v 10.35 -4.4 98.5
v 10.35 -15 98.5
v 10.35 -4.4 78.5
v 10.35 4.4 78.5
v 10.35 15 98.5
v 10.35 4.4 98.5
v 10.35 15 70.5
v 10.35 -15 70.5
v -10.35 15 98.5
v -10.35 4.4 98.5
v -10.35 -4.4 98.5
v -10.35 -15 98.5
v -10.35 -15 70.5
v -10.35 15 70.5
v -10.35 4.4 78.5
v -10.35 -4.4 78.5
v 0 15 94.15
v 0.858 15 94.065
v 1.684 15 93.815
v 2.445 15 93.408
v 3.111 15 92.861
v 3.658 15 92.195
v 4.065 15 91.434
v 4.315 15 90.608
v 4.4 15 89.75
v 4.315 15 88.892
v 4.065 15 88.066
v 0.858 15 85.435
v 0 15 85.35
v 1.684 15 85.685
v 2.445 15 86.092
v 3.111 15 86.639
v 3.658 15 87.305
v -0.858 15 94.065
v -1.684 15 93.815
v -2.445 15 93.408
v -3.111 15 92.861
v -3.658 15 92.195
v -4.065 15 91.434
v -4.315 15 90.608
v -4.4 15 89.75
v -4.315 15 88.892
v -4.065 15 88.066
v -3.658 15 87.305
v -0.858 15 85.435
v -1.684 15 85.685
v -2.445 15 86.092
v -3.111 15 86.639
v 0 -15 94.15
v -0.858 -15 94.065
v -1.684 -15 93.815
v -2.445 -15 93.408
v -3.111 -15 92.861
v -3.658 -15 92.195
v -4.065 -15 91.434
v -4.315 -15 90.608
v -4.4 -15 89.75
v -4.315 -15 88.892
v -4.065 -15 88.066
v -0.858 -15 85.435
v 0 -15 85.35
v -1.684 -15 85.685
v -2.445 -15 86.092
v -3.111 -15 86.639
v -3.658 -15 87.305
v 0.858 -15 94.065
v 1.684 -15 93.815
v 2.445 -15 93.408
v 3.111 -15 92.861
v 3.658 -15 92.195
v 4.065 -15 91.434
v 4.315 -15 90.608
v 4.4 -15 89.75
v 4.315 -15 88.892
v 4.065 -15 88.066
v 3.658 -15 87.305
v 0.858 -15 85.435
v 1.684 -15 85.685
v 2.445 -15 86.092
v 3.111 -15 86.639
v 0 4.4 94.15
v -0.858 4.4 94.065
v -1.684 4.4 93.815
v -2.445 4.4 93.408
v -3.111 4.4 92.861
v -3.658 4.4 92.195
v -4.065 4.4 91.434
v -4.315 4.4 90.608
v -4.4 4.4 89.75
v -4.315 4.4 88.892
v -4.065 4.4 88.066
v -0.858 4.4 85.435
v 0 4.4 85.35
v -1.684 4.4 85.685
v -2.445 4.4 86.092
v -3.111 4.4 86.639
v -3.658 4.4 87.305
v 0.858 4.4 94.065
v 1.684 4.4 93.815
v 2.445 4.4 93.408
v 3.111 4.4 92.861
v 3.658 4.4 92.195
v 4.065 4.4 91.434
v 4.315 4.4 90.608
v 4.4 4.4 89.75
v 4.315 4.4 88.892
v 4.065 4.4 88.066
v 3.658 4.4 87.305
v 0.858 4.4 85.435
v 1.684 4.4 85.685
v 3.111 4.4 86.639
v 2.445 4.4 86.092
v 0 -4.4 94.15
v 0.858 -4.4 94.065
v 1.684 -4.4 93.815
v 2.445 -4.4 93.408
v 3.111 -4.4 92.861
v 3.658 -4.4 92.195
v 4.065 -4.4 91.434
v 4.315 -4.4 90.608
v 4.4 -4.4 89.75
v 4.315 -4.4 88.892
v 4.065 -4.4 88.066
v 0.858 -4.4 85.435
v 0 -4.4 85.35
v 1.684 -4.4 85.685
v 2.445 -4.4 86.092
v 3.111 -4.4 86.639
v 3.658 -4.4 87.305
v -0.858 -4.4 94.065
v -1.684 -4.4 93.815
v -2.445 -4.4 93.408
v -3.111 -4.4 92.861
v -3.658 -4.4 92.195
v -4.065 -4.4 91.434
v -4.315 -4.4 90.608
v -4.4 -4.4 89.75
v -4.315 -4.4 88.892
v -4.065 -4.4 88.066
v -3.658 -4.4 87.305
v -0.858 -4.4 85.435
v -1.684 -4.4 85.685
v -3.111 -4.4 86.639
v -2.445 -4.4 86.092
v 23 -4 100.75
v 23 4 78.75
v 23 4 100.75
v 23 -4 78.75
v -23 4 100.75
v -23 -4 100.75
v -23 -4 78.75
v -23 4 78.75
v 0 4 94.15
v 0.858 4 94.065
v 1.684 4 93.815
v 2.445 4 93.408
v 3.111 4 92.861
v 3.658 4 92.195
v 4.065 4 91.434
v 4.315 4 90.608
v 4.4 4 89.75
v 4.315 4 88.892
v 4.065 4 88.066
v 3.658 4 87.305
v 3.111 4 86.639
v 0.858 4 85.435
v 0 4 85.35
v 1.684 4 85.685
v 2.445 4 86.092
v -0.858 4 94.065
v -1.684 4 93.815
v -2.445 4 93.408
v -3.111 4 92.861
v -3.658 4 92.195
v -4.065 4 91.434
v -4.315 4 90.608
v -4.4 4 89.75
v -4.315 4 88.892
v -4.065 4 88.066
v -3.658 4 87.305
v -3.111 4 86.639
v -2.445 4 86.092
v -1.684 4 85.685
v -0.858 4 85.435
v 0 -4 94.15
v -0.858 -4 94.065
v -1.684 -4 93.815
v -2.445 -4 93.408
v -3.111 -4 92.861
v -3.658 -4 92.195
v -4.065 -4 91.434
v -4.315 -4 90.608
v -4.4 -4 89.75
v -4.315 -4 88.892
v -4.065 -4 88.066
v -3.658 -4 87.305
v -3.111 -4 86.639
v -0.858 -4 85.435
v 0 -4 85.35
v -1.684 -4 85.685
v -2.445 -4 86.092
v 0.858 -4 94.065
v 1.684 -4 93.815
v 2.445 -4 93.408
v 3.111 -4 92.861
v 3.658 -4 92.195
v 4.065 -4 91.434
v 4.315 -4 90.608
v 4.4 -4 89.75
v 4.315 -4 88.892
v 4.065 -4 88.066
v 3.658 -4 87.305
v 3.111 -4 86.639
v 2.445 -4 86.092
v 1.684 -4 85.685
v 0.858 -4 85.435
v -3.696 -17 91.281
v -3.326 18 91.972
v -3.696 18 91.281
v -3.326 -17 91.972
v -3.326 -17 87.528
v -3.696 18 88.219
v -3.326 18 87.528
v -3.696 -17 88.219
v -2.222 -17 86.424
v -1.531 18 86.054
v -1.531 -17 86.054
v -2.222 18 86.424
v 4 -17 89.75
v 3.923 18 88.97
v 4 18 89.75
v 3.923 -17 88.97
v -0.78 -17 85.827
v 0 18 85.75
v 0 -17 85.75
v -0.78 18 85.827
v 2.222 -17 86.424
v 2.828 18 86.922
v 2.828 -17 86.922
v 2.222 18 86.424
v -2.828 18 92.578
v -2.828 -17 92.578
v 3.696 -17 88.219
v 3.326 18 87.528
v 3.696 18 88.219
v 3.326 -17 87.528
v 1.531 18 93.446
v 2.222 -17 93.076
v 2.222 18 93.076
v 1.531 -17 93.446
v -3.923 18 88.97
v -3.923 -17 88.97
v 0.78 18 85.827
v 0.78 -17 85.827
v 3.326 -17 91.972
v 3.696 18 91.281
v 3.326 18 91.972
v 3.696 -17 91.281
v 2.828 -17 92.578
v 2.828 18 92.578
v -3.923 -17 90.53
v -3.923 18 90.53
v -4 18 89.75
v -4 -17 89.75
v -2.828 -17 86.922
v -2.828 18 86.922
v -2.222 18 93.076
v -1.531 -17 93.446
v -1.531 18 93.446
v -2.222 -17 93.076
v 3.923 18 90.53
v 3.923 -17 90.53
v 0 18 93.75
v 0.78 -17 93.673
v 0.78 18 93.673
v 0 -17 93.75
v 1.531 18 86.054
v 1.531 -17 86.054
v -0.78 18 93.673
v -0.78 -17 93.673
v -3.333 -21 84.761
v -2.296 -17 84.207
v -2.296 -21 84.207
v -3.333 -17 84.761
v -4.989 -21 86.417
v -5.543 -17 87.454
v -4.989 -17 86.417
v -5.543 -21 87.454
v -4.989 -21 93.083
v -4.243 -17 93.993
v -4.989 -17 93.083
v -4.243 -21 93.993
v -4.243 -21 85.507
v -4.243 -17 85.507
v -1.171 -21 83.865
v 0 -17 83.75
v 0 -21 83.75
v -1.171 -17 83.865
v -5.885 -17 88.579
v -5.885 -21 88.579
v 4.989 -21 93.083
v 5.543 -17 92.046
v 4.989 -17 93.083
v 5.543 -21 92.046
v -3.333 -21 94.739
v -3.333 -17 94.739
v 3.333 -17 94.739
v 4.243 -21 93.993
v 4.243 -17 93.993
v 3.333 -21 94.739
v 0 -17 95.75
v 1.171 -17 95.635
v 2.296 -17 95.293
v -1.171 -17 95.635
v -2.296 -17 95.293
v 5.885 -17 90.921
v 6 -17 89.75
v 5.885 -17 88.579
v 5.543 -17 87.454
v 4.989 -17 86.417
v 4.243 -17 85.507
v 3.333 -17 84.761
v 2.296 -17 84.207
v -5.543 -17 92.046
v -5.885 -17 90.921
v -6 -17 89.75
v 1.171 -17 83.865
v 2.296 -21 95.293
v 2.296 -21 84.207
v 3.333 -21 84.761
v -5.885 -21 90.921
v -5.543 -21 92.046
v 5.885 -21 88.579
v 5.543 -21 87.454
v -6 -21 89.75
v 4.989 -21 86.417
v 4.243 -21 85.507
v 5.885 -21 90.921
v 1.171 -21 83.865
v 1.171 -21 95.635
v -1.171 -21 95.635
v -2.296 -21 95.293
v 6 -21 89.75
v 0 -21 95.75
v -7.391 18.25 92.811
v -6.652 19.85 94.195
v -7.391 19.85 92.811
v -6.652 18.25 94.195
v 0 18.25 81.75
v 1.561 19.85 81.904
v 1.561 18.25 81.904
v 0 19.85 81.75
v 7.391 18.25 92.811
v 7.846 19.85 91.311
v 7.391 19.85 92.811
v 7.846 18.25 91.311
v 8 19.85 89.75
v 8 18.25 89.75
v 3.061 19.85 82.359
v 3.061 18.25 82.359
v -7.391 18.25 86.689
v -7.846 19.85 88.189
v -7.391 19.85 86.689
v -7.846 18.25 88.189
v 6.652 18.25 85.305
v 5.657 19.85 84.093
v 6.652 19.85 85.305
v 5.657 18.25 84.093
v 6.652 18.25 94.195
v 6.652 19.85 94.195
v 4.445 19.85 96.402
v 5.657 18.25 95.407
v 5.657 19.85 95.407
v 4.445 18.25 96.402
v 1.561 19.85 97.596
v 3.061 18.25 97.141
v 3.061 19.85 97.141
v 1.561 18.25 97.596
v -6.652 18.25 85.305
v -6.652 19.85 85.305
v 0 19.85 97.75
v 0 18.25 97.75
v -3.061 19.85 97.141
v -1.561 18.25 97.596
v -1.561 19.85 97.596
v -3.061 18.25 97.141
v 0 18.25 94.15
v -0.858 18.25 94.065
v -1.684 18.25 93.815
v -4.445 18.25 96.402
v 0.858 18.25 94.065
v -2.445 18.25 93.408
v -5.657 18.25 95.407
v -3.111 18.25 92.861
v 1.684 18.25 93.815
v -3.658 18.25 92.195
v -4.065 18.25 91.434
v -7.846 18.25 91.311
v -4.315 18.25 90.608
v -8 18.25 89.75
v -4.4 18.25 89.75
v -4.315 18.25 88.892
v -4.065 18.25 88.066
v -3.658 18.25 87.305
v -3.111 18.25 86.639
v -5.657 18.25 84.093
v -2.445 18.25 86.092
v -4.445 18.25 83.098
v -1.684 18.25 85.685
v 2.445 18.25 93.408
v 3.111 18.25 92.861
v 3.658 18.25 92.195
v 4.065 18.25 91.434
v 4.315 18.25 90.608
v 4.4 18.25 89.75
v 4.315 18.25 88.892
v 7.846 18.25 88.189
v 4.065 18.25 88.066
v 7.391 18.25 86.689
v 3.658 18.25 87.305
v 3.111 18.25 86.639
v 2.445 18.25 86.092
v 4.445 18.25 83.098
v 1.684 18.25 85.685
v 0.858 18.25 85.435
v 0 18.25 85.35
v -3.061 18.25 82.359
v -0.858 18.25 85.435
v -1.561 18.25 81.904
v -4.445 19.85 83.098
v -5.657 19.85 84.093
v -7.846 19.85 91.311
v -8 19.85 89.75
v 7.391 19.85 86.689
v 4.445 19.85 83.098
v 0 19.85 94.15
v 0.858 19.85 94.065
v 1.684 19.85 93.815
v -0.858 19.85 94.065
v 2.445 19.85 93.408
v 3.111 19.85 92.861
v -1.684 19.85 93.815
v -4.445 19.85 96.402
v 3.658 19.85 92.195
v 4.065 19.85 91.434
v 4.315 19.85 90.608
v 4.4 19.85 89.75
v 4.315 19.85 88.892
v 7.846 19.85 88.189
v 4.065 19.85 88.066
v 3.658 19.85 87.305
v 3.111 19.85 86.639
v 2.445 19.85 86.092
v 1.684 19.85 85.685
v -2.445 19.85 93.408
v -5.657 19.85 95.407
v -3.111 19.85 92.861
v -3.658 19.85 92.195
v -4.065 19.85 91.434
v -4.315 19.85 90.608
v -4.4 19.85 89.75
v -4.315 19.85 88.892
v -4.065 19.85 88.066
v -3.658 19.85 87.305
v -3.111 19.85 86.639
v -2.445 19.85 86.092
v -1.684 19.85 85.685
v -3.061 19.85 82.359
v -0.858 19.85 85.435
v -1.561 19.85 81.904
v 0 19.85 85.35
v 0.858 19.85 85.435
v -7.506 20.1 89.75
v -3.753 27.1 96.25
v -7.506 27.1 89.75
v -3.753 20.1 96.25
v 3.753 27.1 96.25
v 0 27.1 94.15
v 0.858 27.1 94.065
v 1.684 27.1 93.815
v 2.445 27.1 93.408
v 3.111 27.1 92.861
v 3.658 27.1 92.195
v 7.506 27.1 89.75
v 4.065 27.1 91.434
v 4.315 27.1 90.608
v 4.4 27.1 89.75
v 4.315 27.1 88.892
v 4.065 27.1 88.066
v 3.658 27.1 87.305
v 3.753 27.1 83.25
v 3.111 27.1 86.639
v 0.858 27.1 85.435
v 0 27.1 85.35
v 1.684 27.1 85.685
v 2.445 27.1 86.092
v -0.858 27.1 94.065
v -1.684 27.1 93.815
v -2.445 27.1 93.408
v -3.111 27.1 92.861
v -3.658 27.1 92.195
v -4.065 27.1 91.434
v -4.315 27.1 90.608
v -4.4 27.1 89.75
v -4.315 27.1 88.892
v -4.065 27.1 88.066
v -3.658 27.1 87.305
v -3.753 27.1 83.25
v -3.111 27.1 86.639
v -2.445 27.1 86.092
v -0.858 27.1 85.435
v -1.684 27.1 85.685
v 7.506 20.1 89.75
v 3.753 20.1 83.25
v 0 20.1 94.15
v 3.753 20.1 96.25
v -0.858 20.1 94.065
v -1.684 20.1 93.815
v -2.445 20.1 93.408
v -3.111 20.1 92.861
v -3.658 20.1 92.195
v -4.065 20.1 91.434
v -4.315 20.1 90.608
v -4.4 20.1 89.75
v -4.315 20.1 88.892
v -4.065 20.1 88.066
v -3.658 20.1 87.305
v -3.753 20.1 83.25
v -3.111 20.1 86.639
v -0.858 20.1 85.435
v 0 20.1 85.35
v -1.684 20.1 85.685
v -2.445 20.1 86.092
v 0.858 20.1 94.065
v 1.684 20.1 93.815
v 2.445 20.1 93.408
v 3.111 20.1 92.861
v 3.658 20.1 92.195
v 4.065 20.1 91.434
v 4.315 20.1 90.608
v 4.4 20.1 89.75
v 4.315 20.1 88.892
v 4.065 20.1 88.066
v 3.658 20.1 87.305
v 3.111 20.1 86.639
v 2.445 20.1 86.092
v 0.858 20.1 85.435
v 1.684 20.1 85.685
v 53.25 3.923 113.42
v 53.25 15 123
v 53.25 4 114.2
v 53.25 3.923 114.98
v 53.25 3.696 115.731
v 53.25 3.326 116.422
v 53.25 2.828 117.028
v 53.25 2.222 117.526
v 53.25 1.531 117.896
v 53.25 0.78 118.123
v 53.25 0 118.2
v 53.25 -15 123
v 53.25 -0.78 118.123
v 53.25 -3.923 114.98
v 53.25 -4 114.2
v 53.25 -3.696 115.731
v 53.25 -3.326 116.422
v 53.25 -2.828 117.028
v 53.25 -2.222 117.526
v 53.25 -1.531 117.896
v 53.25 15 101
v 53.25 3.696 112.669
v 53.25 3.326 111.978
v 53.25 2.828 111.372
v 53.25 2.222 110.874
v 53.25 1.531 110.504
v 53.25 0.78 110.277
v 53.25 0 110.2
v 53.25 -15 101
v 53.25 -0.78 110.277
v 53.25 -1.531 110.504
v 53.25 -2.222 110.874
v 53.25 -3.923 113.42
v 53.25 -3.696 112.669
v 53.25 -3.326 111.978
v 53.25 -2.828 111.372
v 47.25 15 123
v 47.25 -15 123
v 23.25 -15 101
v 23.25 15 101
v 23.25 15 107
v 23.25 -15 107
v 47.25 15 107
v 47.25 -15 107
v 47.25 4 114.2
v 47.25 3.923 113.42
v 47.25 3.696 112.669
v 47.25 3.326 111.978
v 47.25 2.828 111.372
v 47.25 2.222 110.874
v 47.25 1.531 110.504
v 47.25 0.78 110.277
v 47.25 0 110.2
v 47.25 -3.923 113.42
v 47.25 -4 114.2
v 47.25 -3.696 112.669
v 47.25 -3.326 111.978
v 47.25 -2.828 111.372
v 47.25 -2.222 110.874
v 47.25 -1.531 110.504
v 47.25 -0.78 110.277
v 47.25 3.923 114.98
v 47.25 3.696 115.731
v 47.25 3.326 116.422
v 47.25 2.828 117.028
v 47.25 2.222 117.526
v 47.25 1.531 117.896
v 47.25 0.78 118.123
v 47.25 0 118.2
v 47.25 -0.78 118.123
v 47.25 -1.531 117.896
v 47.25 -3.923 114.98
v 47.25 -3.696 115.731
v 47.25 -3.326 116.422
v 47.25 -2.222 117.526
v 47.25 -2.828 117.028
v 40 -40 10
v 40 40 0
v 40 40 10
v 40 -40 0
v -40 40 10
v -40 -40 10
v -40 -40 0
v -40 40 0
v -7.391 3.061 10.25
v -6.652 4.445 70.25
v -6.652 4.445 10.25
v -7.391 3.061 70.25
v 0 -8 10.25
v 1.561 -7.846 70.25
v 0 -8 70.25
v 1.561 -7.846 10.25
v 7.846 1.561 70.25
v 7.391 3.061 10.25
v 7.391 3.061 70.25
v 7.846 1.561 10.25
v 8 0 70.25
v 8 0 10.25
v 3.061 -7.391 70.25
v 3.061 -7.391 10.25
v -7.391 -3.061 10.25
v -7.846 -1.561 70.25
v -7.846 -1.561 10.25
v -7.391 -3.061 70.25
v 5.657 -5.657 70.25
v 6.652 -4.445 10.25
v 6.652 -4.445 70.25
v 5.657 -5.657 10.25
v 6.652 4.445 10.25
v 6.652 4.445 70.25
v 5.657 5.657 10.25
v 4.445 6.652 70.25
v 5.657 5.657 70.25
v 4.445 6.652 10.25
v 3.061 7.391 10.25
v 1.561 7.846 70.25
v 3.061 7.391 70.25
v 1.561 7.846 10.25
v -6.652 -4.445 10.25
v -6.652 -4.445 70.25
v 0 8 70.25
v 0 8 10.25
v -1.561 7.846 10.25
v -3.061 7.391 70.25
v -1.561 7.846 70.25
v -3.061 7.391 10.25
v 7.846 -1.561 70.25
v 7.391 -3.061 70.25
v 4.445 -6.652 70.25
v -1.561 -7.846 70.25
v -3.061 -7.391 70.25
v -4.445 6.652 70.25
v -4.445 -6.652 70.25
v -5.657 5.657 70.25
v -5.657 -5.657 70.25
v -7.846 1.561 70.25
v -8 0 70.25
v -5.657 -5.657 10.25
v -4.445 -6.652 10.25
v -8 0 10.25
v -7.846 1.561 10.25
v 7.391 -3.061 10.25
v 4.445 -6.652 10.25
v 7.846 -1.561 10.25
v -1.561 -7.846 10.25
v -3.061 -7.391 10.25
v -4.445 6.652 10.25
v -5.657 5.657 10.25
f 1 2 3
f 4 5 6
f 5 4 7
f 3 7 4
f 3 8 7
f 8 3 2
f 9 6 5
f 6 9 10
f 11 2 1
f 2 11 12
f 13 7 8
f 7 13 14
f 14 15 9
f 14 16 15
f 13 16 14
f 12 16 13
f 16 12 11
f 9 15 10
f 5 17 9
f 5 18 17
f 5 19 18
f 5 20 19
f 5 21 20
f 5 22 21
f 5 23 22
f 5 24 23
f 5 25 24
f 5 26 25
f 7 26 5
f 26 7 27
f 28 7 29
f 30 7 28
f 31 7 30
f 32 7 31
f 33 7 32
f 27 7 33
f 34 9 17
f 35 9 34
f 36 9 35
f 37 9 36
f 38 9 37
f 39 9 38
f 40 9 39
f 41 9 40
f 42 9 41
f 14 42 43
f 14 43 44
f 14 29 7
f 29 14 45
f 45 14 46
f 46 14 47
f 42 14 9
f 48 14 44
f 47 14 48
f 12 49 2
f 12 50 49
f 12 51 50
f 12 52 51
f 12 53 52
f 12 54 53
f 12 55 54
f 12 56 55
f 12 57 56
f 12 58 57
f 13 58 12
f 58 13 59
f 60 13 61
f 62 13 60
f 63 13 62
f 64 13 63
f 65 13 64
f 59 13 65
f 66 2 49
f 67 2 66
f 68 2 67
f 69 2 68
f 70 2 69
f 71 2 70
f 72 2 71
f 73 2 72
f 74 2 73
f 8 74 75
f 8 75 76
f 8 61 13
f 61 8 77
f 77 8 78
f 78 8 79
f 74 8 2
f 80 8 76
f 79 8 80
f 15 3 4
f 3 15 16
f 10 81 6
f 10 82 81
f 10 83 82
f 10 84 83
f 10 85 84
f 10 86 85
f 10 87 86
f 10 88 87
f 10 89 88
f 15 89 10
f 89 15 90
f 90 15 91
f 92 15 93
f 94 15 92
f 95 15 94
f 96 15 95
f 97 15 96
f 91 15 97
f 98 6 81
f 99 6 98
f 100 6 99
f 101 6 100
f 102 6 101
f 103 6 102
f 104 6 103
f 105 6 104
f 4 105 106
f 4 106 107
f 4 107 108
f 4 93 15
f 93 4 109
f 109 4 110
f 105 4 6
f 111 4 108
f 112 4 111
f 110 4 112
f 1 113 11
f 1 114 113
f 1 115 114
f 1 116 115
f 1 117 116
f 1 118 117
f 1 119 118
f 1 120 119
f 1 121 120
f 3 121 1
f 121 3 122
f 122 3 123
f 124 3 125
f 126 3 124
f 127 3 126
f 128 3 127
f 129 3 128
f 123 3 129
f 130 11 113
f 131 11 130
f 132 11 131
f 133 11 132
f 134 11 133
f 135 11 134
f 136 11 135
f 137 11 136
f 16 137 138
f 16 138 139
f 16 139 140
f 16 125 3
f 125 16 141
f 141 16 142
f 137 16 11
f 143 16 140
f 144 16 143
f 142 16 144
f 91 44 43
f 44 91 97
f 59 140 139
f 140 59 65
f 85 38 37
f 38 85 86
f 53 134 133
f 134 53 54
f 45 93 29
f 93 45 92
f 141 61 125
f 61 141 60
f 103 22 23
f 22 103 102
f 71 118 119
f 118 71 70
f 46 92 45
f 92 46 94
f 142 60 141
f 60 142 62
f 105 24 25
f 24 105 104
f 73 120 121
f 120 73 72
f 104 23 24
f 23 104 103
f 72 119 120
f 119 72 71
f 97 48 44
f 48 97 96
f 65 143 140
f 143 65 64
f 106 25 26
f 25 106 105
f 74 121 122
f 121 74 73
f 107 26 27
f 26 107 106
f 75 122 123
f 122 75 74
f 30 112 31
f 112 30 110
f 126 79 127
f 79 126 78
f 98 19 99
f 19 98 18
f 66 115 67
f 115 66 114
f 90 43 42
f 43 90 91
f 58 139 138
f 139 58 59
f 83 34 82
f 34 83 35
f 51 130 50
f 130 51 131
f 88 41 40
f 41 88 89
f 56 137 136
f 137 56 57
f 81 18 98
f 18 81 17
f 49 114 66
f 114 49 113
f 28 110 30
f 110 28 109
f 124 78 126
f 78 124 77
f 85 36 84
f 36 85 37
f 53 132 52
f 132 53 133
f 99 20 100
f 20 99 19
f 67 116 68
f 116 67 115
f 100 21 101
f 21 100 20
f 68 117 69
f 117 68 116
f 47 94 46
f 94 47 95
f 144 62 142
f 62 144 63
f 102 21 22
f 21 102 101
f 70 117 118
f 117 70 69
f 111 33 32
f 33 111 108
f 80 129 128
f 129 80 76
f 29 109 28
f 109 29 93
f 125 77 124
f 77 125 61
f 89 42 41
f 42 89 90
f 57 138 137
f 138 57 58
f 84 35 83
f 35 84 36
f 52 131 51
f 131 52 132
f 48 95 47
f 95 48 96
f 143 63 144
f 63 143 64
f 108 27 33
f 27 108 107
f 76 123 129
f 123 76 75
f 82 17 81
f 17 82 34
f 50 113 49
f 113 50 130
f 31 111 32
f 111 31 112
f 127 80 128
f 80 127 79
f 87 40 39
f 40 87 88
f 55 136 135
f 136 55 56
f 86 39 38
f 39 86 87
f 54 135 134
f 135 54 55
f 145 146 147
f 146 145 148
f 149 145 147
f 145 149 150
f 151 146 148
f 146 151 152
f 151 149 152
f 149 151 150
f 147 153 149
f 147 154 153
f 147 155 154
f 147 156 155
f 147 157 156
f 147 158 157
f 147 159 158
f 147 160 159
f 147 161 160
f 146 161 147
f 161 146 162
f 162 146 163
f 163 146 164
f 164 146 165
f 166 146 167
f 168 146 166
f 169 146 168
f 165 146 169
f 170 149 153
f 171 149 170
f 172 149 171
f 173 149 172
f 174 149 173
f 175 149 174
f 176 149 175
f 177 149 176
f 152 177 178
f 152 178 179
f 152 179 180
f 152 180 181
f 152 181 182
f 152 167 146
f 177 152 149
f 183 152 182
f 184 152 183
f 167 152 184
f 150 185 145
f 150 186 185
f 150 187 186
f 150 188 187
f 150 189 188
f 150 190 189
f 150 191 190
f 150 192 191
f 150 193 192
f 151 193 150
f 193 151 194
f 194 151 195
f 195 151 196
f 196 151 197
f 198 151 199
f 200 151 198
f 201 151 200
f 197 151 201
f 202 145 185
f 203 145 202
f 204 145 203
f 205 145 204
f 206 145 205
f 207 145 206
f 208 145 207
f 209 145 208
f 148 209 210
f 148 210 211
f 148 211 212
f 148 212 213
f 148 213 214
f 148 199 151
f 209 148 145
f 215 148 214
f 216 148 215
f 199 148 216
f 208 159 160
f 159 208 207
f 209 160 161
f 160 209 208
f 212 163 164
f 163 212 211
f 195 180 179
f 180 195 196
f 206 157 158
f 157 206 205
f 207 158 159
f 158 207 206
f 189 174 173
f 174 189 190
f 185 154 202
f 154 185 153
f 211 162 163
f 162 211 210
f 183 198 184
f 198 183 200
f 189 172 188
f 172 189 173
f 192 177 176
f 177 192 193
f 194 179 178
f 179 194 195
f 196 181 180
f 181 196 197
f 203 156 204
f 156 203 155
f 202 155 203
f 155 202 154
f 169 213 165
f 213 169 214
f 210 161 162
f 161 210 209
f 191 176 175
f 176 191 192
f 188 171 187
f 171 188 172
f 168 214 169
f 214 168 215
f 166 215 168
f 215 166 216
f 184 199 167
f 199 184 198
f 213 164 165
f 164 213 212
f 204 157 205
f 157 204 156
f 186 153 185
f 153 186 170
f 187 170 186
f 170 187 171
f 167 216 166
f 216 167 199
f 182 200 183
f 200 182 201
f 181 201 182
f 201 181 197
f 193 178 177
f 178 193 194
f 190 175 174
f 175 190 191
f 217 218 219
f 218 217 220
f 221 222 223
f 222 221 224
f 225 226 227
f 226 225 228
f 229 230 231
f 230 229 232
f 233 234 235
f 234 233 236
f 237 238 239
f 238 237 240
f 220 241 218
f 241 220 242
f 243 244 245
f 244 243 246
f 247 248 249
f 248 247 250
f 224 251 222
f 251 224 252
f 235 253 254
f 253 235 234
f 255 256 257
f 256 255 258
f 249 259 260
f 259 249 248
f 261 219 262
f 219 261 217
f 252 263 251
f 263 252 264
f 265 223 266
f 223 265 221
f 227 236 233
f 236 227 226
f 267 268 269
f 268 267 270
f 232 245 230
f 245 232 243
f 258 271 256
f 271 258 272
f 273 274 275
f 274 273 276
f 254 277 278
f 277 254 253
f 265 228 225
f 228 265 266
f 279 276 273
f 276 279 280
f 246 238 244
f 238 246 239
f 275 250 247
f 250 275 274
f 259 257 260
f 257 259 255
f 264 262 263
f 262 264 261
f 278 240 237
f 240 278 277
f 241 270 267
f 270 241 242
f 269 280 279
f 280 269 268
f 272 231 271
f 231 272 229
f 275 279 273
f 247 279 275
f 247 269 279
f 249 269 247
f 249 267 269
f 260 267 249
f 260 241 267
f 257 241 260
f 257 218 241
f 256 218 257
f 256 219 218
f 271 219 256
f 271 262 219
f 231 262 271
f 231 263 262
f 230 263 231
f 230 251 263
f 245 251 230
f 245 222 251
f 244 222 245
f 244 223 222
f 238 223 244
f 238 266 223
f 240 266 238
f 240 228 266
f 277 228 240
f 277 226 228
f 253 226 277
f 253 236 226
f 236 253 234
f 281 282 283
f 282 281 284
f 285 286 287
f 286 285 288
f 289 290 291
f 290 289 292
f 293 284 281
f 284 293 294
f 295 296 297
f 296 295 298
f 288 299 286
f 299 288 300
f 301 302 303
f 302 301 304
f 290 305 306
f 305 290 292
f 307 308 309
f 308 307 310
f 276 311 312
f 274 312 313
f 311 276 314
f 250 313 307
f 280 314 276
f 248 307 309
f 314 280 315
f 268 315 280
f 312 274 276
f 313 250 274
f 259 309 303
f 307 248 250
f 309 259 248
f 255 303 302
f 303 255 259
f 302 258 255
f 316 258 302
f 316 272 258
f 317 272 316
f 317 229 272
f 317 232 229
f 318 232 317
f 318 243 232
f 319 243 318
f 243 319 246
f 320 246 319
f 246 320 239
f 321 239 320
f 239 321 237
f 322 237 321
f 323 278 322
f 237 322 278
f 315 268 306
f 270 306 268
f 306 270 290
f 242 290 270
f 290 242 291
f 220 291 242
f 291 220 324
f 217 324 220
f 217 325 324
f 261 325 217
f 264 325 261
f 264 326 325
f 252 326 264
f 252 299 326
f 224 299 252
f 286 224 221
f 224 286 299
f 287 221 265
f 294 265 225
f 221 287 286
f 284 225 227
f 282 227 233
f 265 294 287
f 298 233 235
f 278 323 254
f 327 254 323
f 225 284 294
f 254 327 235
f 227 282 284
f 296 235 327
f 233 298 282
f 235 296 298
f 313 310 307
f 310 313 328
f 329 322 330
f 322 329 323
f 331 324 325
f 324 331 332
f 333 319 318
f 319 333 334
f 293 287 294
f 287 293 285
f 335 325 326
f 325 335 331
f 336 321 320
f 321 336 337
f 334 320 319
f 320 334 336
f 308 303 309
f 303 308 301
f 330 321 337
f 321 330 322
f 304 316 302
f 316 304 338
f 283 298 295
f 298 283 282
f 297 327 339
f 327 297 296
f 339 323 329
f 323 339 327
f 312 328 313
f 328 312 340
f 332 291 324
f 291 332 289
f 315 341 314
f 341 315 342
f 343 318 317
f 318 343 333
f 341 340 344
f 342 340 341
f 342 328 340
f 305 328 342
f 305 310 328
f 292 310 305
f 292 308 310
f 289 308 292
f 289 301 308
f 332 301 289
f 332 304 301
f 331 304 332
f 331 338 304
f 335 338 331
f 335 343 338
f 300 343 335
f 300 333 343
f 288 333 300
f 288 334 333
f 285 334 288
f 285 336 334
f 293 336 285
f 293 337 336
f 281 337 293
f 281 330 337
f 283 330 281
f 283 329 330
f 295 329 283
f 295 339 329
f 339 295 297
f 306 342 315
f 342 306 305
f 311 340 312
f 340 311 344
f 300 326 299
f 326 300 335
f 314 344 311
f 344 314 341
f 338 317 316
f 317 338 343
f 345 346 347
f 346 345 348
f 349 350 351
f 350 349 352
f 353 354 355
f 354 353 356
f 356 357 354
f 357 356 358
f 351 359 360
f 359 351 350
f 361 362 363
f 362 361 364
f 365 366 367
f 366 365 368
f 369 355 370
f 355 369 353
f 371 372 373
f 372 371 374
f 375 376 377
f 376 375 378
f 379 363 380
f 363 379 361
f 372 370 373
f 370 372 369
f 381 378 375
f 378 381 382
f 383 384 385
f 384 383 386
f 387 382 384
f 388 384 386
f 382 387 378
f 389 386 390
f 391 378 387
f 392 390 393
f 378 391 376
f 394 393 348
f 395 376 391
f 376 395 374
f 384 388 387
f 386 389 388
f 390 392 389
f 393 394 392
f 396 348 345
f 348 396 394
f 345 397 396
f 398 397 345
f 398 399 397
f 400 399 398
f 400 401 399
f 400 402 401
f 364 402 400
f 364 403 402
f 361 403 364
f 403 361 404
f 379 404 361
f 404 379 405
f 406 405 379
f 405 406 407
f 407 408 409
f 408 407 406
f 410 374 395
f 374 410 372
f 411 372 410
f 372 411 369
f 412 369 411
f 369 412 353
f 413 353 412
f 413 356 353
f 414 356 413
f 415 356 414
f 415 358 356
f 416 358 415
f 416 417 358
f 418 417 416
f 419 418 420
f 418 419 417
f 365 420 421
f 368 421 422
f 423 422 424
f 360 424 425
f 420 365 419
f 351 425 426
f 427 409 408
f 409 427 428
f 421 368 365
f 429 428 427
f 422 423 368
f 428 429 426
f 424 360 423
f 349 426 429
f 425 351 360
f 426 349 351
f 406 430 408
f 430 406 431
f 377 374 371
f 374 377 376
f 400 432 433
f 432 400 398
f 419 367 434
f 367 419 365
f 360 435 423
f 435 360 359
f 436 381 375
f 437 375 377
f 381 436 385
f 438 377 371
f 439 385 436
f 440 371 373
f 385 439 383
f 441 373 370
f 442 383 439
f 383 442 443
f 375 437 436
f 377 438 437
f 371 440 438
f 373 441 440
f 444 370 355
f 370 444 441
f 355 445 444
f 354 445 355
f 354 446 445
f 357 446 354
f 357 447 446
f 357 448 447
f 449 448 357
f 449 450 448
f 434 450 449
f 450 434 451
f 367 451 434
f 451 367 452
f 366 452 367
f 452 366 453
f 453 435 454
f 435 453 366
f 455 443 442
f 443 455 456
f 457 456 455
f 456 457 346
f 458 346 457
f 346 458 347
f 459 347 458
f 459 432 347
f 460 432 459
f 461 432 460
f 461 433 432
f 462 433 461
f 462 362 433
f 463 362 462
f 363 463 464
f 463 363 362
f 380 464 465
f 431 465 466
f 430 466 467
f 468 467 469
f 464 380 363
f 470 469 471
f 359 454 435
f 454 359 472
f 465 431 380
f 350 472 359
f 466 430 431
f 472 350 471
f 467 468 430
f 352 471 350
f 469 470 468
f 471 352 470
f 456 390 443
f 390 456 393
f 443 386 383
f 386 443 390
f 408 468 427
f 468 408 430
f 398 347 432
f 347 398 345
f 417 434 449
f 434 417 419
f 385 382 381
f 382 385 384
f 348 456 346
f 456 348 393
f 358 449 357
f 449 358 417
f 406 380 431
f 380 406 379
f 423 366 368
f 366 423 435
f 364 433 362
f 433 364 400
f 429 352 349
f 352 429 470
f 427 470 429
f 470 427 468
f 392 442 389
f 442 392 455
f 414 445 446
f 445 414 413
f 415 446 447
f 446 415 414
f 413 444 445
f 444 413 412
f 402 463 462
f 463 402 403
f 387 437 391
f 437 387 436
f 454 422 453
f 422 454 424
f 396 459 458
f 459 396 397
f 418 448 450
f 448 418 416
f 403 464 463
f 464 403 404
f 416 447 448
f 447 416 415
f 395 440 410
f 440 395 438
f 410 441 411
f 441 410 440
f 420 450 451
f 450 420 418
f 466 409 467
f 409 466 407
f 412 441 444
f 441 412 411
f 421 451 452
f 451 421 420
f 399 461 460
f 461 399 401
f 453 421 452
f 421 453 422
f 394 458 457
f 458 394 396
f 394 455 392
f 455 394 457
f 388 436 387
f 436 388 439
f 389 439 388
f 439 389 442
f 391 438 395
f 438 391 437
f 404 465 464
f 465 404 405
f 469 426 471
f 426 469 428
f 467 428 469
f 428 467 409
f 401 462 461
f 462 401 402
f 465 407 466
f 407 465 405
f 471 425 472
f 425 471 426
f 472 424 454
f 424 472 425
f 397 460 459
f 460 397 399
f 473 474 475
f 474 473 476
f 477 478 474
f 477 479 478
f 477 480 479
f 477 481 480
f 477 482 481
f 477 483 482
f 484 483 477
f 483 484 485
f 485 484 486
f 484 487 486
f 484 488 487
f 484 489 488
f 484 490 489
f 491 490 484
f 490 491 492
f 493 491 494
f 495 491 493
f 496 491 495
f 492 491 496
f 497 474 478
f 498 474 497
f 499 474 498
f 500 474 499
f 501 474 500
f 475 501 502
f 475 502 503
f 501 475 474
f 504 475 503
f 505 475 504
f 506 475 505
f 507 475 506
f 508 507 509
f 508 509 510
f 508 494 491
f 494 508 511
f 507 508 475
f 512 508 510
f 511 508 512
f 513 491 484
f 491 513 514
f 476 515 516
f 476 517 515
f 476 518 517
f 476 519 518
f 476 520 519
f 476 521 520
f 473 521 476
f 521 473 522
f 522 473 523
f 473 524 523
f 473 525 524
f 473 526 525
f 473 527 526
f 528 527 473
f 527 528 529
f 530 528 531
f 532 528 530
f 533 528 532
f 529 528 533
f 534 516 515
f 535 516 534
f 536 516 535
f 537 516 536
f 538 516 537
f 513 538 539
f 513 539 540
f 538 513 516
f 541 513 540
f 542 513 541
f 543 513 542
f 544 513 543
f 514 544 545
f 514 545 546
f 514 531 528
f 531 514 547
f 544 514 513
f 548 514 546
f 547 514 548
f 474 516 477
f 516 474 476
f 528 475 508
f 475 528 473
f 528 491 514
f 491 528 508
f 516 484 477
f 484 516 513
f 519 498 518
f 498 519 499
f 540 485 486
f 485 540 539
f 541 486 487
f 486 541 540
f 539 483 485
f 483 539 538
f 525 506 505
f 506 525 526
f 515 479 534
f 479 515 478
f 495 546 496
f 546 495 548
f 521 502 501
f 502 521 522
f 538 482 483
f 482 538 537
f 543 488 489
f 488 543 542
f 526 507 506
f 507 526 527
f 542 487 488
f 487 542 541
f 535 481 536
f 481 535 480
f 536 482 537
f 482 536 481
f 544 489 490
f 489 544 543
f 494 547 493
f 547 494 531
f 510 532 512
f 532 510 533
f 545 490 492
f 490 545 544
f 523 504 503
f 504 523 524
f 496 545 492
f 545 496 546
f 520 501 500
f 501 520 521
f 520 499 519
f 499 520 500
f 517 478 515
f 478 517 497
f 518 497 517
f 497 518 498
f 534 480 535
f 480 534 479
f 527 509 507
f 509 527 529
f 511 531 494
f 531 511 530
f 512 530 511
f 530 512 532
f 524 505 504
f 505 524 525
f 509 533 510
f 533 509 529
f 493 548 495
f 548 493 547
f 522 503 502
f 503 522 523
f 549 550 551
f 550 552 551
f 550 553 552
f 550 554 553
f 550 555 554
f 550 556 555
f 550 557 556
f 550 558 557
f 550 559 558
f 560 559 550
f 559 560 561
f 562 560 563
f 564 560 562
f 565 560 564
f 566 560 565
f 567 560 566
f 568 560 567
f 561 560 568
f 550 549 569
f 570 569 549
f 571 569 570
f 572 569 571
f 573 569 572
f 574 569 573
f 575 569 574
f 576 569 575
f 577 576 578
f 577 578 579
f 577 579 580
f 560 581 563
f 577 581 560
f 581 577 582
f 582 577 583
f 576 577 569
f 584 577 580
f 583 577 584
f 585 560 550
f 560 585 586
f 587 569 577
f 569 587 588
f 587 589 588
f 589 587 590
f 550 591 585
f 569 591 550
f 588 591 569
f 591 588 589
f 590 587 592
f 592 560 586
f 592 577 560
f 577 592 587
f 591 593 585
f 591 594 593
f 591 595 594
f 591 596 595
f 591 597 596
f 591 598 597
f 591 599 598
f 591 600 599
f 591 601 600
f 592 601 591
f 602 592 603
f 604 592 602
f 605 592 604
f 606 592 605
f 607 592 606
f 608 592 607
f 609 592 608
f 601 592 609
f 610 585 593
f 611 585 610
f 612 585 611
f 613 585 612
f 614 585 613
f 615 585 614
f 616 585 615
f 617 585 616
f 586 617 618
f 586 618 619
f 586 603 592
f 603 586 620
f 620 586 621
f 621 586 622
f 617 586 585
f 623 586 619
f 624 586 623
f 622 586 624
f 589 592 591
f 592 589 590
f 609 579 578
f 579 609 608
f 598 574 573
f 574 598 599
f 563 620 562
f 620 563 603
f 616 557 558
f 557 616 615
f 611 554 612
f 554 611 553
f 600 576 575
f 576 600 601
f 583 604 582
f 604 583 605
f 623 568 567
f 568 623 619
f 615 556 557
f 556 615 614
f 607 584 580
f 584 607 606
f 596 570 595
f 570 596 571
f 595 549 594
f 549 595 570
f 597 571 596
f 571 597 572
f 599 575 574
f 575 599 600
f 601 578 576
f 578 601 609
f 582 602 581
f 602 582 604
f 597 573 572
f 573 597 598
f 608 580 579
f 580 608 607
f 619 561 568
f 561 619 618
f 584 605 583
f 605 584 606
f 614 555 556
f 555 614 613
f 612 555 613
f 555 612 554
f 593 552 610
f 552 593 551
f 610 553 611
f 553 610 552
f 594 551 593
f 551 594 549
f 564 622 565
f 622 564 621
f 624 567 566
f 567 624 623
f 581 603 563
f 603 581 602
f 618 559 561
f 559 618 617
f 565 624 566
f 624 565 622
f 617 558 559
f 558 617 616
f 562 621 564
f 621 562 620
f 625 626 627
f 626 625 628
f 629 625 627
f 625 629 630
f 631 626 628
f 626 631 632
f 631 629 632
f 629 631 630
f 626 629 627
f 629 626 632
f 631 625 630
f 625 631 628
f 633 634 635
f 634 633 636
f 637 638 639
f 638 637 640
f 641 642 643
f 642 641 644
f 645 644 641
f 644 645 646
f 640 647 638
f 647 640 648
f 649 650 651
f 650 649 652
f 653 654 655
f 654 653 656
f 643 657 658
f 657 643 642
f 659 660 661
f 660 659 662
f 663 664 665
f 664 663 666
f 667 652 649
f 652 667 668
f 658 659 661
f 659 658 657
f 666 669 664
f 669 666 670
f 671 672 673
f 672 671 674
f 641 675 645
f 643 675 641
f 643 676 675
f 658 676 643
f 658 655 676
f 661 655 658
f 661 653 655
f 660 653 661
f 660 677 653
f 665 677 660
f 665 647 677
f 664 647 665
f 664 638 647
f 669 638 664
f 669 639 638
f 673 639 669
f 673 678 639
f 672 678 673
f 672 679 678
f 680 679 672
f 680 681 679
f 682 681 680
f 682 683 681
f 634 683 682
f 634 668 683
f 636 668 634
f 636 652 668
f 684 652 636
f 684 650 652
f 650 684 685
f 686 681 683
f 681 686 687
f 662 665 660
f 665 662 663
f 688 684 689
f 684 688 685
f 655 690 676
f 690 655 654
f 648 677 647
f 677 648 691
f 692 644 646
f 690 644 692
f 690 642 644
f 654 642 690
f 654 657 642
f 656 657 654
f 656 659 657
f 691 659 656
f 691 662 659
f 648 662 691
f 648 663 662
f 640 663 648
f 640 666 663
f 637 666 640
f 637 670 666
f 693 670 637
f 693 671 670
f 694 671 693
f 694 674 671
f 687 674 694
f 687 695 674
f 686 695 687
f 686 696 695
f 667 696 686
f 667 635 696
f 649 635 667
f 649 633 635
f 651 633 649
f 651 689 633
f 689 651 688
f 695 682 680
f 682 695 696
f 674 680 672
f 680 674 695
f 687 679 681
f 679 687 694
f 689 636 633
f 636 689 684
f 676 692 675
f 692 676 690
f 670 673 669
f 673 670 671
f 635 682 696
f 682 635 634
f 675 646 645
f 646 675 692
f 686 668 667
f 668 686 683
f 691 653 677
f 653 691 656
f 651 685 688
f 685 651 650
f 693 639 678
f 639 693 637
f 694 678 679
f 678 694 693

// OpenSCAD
$fn = 32;

// ------------------------------------------------------------------------
// Lamp arm: column d16 x 60 mm, arm 46 mm
// Every part is its own module, assembly() places every instance.
// ------------------------------------------------------------------------

// --- part 1 ---
module lamp_base() {
  difference() {
    translate([-40, -40, 0]) cube([80, 80, 10]);
  }
}

// --- part 2 ---
module lamp_column() {
  cylinder(h = 60, d = 16);
}

// --- part 3 ---
module head_fork() {
  difference() {
    translate([-10.35, -15, 0]) cube([20.7, 30, 28]);
    translate([-11.35, -4.4, 8]) cube([22.7, 8.8, 21]);
    translate([0, 0, 19.25]) rotate([90, 0, 0]) cylinder(h = 32, d = 8.8, center = true);
  }
}

// --- part 4 ---
module lamp_arm() {
  difference() {
    translate([-23, -4, 0]) cube([46, 8, 22]);
    translate([0, 0, 11]) rotate([90, 0, 0]) cylinder(h = 10, d = 8.8, center = true);
  }
}

// --- part 5 ---
module arm_pin() {
  rotate([0, 90, 0]) cylinder(h = 36, d = 8, center = true);
  translate([-21, 0, 0]) rotate([0, 90, 0]) cylinder(h = 4, d = 12);
}

// --- part 6 ---
module arm_washer() {
  difference() {
      translate([0, 0, 0]) cylinder(h = 1.6, d = 16);
      translate([0, 0, -1]) cylinder(h = 3.6, d = 8.8);
    }
}

// --- part 7 ---
module arm_nut() {
  difference() {
    linear_extrude(height = 7) polygon(points = [[7.506, 0], [3.753, 6.5], [-3.753, 6.5], [-7.506, 0], [-3.753, -6.5], [3.753, -6.5]]);
    translate([0, 0, -1]) cylinder(h = 9, d = 8.8);
  }
}

// --- part 8 ---
module shade_bracket() {
  difference() {
    translate([-15, -15, 0]) cube([30, 30, 22]);
    translate([-16, -16, 6]) cube([25, 32, 17]);
    translate([12, 0, 13.2]) rotate([0, 90, 0]) cylinder(h = 8, d = 8, center = true);
  }
}

// --- assembly ---
module assembly() {
  color([0.80, 0.24, 0.20]) translate([0, 0, 0]) rotate([0, 0, 0]) lamp_base();
  color([0.20, 0.45, 0.75]) translate([0, 0, 10.25]) rotate([0, 0, 0]) lamp_column();
  color([0.25, 0.62, 0.32]) translate([0, 0, 70.5]) rotate([0, 0, 0]) head_fork();
  color([0.92, 0.70, 0.18]) translate([0, 0, 78.75]) rotate([0, 0, 0]) lamp_arm();
  color([0.58, 0.35, 0.70]) translate([0, 0, 89.75]) rotate([0, 0, 90]) arm_pin();
  color([0.16, 0.66, 0.66]) translate([0, 19.85, 89.75]) rotate([90, 0, 0]) arm_washer();
  color([0.85, 0.48, 0.18]) translate([0, 27.1, 89.75]) rotate([90, 0, 0]) arm_nut();
  color([0.55, 0.60, 0.65]) translate([38.25, 0, 101]) rotate([0, 0, 0]) shade_bracket();
}

assembly();
